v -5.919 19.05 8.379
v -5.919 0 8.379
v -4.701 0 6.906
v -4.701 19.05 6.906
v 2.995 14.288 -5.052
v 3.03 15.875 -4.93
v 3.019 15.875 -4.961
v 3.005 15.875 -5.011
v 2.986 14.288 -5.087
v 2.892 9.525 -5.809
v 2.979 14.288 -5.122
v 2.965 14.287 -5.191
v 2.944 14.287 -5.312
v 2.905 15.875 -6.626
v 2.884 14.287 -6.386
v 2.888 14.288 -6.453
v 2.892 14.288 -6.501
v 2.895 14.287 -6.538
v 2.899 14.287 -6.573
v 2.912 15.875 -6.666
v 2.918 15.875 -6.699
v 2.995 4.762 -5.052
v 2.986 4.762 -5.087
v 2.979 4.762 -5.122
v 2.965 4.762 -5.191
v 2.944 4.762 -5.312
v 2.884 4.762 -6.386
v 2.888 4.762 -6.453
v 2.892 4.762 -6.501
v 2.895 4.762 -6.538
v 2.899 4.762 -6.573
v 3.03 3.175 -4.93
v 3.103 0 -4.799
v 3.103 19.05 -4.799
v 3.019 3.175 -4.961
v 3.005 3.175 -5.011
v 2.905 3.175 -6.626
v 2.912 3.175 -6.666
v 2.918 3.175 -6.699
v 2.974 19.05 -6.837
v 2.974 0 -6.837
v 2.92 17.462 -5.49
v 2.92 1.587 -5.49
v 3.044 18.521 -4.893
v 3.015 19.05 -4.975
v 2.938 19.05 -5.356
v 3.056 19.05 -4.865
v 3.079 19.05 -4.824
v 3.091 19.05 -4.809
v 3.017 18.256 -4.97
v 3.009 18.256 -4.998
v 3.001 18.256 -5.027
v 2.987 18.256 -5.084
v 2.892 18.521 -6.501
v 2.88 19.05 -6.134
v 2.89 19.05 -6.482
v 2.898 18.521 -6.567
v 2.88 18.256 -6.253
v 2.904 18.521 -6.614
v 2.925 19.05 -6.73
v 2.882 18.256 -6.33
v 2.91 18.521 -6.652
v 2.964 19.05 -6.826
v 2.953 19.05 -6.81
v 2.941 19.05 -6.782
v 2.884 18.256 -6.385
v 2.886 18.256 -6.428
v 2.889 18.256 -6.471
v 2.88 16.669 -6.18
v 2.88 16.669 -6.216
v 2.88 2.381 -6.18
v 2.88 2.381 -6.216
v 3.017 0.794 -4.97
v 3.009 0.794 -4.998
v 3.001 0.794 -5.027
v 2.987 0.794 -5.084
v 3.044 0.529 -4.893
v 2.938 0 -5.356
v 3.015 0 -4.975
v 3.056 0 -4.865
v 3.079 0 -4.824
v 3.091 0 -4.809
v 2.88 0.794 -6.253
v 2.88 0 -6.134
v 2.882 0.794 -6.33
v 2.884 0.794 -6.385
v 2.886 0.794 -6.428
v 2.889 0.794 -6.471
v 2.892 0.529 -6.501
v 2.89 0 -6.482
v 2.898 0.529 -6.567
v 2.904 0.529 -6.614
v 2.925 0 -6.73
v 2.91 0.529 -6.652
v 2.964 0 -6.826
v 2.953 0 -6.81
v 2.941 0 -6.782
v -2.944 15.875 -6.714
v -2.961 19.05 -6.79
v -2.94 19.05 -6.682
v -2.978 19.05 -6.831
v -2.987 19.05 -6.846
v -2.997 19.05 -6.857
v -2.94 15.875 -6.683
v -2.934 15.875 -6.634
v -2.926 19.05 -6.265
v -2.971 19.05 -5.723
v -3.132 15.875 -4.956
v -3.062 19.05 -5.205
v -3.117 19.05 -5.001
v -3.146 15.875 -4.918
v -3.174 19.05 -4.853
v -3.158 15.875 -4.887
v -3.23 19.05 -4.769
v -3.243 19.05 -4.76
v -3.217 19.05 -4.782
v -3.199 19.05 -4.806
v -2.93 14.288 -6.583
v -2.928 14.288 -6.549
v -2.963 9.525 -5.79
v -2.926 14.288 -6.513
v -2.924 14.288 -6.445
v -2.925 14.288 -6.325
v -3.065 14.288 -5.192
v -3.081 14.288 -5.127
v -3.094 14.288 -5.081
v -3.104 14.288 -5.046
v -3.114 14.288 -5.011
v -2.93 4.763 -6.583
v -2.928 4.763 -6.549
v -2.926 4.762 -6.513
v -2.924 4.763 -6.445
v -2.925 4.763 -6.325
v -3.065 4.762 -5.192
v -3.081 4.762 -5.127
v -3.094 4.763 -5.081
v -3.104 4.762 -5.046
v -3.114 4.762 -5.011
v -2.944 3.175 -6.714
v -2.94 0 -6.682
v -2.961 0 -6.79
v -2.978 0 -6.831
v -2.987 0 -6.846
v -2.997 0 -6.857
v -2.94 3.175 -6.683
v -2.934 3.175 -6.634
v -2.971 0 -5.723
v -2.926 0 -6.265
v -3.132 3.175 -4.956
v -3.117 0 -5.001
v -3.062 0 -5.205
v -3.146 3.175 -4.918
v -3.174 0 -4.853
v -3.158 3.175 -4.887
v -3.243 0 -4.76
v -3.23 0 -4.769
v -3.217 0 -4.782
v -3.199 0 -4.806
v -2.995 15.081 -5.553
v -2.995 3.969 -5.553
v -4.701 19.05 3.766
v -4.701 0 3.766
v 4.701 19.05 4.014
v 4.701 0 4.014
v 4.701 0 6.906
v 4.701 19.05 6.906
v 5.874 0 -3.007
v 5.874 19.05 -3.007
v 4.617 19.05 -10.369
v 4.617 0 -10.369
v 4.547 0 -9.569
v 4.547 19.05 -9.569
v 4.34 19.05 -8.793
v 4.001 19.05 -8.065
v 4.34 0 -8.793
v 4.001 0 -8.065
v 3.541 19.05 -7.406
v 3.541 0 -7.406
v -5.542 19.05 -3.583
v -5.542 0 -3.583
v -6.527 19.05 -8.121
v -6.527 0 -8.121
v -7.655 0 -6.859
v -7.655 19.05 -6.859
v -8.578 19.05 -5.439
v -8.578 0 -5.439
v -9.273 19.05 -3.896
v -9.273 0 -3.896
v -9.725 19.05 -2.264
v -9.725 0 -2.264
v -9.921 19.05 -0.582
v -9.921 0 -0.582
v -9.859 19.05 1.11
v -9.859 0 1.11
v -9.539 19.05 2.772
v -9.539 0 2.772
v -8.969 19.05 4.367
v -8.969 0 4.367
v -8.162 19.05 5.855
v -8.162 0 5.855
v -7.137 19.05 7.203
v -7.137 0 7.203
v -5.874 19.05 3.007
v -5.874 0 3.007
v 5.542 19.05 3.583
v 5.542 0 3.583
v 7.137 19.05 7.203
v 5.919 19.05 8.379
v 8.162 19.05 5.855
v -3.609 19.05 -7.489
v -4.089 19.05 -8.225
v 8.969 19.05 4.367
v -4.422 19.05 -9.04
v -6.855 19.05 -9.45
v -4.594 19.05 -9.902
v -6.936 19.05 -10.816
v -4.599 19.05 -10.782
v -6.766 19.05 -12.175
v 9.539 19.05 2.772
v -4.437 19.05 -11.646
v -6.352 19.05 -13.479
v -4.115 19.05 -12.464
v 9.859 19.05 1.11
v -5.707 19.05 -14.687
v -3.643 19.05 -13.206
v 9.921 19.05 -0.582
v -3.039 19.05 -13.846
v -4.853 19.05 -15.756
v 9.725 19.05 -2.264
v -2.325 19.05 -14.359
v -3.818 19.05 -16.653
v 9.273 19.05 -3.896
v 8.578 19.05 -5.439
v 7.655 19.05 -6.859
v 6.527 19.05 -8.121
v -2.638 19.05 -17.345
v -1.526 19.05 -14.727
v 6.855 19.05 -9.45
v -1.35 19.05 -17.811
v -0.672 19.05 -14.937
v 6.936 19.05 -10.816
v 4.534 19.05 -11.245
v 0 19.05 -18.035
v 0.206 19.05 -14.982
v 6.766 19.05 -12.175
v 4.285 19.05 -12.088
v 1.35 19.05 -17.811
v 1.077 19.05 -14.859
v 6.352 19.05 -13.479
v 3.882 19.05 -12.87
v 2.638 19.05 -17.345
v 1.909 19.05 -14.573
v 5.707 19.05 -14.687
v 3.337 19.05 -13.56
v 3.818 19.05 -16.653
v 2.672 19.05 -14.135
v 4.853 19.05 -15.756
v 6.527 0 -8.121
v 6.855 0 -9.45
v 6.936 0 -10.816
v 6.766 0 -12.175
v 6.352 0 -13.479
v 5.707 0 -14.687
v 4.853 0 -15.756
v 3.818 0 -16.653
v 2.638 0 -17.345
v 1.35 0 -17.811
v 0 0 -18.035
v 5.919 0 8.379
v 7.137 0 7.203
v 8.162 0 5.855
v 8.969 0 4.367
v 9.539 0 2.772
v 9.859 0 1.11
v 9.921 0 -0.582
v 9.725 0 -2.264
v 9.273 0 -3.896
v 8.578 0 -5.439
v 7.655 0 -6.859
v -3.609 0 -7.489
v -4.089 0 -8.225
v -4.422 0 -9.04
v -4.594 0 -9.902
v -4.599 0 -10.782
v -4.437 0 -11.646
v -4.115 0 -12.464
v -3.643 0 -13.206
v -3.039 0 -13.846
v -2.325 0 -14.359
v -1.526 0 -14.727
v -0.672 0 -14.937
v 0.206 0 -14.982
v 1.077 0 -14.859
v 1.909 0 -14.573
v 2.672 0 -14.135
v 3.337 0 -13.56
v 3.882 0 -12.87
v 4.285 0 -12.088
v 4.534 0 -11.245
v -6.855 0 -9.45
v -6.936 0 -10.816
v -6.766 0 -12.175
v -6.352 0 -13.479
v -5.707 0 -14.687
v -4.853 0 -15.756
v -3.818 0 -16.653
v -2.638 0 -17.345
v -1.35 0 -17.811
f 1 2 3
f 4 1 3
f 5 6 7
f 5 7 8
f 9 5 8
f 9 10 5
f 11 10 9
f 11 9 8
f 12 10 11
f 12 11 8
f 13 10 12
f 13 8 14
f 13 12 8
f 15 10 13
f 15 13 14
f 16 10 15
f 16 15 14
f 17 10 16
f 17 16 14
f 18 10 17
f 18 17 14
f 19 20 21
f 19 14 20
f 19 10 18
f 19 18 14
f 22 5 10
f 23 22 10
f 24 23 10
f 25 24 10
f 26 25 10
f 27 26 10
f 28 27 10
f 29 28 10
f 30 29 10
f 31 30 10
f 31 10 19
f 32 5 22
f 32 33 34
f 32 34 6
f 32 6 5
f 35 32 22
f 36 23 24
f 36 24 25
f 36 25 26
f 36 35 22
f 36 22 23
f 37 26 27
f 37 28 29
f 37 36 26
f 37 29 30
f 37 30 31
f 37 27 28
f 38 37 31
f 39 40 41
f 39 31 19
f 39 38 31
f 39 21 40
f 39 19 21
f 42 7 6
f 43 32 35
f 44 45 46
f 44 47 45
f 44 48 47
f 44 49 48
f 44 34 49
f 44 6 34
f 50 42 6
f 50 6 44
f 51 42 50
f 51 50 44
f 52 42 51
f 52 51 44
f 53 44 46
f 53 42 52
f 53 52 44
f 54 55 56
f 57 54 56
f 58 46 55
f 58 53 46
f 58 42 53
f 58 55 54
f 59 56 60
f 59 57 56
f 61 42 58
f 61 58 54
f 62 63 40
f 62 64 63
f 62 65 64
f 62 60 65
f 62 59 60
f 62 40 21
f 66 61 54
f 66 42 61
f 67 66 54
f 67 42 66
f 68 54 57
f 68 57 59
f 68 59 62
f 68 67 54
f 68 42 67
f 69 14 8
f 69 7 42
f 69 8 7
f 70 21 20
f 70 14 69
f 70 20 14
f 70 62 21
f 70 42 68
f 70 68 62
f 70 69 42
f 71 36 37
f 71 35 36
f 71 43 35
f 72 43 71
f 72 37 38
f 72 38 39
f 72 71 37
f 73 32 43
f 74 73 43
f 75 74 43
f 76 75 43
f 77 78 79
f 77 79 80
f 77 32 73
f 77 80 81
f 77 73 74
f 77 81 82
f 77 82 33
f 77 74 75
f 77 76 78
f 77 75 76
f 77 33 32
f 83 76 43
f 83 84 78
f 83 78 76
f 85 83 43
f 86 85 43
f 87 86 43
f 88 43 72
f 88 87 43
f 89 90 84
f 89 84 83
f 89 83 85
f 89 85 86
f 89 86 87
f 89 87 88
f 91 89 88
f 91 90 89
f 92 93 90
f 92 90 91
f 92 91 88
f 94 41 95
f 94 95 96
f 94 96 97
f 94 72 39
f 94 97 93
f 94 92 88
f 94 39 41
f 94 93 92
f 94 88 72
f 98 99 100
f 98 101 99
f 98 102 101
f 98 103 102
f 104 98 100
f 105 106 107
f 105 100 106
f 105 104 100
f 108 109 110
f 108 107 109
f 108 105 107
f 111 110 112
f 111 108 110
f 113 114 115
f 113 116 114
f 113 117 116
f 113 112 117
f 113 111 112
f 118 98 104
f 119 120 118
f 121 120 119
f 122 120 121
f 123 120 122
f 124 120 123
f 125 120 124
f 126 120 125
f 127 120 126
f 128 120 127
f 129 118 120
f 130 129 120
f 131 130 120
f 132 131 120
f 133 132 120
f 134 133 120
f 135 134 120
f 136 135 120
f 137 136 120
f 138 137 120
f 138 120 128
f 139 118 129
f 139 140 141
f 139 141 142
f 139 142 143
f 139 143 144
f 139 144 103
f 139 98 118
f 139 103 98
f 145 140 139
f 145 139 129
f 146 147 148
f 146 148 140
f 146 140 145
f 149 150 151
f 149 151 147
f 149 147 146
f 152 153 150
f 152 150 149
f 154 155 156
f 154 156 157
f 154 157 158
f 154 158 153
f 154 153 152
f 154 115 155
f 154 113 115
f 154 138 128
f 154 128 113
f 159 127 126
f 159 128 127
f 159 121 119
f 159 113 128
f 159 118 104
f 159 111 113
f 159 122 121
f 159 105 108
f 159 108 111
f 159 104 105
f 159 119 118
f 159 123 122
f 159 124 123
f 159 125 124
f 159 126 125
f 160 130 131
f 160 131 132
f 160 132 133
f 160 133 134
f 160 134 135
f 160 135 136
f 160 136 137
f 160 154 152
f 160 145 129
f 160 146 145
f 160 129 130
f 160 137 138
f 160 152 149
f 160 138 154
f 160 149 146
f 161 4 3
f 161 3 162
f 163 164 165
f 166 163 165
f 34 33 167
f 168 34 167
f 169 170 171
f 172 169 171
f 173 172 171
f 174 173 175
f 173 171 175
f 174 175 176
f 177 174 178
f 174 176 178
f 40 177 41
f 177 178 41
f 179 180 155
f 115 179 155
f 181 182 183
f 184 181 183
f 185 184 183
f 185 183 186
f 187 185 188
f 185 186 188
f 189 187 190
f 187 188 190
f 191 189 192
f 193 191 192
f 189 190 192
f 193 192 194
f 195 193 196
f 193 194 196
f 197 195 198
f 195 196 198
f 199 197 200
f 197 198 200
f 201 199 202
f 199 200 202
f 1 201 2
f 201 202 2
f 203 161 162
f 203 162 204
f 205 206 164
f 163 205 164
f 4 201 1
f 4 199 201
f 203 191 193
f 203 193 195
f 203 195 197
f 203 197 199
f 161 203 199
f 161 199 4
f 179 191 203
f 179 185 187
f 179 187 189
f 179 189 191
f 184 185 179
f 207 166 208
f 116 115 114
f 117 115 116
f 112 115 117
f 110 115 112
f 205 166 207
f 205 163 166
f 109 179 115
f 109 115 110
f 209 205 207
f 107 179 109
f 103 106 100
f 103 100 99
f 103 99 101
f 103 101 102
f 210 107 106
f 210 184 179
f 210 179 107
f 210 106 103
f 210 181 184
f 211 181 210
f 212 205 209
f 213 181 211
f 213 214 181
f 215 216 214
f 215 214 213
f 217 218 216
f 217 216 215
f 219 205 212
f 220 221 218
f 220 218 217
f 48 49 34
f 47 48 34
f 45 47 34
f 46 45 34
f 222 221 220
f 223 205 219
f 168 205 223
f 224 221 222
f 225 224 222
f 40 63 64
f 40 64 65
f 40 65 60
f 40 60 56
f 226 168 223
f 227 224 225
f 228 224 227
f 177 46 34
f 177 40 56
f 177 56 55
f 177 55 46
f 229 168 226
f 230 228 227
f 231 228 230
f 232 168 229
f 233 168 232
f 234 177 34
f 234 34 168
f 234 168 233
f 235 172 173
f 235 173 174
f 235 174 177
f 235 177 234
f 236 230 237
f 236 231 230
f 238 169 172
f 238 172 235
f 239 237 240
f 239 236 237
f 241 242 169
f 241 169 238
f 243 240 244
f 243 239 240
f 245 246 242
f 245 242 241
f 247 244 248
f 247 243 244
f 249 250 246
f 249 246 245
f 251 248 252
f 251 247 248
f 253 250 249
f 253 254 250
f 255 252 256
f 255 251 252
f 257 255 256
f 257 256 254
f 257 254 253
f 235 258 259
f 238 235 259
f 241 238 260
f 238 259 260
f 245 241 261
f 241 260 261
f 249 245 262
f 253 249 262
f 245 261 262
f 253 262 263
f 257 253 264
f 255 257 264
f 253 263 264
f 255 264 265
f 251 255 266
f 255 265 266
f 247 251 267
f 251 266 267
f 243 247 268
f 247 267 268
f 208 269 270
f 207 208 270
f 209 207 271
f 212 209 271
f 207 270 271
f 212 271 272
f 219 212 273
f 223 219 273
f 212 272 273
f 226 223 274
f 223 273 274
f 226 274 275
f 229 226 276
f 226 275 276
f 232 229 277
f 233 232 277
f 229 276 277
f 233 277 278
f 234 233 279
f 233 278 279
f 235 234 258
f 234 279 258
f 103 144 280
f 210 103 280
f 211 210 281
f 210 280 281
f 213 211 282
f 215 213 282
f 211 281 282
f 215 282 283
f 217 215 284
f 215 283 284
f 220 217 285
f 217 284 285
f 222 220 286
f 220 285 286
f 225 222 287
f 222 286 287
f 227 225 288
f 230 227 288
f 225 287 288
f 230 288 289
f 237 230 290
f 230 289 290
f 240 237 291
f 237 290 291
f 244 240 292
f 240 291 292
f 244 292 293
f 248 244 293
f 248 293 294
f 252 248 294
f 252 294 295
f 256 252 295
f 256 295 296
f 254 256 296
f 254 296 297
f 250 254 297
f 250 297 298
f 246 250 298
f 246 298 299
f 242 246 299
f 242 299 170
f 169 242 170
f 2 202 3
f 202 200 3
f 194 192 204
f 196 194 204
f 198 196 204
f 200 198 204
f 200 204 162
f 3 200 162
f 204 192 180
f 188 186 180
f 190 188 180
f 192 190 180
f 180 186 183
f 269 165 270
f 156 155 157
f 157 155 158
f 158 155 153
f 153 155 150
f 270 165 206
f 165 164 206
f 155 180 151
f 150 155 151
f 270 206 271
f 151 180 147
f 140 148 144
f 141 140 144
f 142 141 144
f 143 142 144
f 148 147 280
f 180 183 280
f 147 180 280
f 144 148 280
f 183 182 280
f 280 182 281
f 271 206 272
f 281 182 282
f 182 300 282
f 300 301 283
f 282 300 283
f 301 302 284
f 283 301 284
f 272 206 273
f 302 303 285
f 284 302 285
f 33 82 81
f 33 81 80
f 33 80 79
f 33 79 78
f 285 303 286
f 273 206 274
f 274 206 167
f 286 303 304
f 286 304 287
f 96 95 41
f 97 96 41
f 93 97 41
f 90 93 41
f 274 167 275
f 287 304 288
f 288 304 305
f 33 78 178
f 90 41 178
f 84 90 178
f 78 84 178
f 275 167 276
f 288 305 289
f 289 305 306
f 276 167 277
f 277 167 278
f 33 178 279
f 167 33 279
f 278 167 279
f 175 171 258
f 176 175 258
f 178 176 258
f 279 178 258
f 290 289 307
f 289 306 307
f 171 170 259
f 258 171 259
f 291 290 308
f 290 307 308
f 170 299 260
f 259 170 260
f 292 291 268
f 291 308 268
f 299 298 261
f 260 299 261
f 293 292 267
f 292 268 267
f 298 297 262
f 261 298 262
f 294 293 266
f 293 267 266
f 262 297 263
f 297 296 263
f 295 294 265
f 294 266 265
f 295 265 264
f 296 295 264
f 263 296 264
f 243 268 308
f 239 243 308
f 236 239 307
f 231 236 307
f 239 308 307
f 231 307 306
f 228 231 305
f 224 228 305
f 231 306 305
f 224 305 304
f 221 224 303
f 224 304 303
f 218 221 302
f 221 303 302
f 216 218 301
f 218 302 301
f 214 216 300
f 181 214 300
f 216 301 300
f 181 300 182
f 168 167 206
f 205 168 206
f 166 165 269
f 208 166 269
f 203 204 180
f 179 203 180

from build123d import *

# Parameters (mm, degrees)
BOSS_EXTRUDE1_DEPTH = 19.05


with BuildPart() as part:
    # Sketch3 → Boss-Extrude1 (new body)
    with BuildSketch(Plane(origin=(0, 0, 0), x_dir=(1, 0, 0), z_dir=(0, 1, 0))):
        with BuildLine():
            Line((-5.541525375, 3.58326618), (-2.47962532, 5.150959008))
            Line((-2.47962532, 5.150959008), (-2.47962532, 6.474170352))
            ThreePointArc((-2.47962532, 6.474170352), (-2.221563685, 14.417025562), (4.617359972, 10.369227654))
            ThreePointArc((4.617359972, 10.369227654), (4.047797908, 8.147663968), (2.47962532, 6.474170352))
            Line((2.47962532, 6.474170352), (2.47962532, 5.20231788))
            Line((2.47962532, 5.20231788), (5.873962228, 3.007468661))
            Line((5.873962228, 3.007468661), (5.541525375, -3.58326618))
            Line((5.541525375, -3.58326618), (4.701204968, -4.013510228))
            Line((4.701204968, -4.013510228), (4.701204968, -6.905610932))
            Line((4.701204968, -6.905610932), (5.918780254, -8.378526195))
            ThreePointArc((5.918780254, -8.378526195), (9.922634137, -0.265088751), (6.526624698, 8.120961152))
            ThreePointArc((6.526624698, 8.120961152), (5.706991897, 14.686716316), (0, 18.035026682))
            ThreePointArc((0, 18.035026682), (-5.706991897, 14.686716316), (-6.526624698, 8.120961152))
            ThreePointArc((-6.526624698, 8.120961152), (-9.922634137, -0.265088751), (-5.918780254, -8.378526195))
            Line((-5.918780254, -8.378526195), (-4.701204968, -6.905610932))
            Line((-4.701204968, -6.905610932), (-4.701204968, -3.765798027))
            Line((-4.701204968, -3.765798027), (-5.873962228, -3.007468661))
            Line((-5.873962228, -3.007468661), (-5.541525375, 3.58326618))
        make_face()
        with BuildLine():
            Line((-2.47962532, 6.474170352), (-2.47962532, 5.150959008))
            Line((-2.47962532, 5.150959008), (-1.063503338, 5.876013463))
            ThreePointArc((-1.063503338, 5.876013463), (-1.79663243, 6.115743784), (-2.47962532, 6.474170352))
        make_face()
        with BuildLine():
            ThreePointArc((2.47962532, 6.474170352), (1.921985685, 6.17089654), (1.328021538, 5.946968965))
            Line((1.328021538, 5.946968965), (2.47962532, 5.20231788))
            Line((2.47962532, 5.20231788), (2.47962532, 6.474170352))
        make_face()
    extrude(amount=BOSS_EXTRUDE1_DEPTH)

    # Fillet6
    # a fillet whose section is not a circle: 1.27 mm, written as the material it takes off along each edge
    with BuildSketch(Plane(origin=(1.328021538, -5.283304691, -5.946968965), x_dir=(0.8397378391322112, 0, 0.5429920455490709), z_dir=(0, 1, 0))) as fillet6_piece_1:
        with BuildLine():
            Bezier((2.113321876, 0), (0.3966534, 0), (0.898889741, 1.641556979), weights=[1, 0.118948346, 1])
            ThreePointArc((0.898889741, 1.641556979), (0.533488386, 0.774757636), (0, 0))
            Line((0, 0), (2.113321876, 0))
        make_face()
    extrude(amount=29.616609382, mode=Mode.SUBTRACT)
    with BuildSketch(Plane(origin=(-1.063503338, -6.120582224, -5.876013463), x_dir=(-0.891835980226881, 0, -0.4523589110128793), z_dir=(0, 1, 0))) as fillet6_piece_2:
        with BuildLine():
            Bezier((2.168149873, 0), (0.323600022, 0.445521101), (1.438773255, 1.980852292), weights=[1, 0.11123936, 1])
            Line((1.438773255, 1.980852292), (0, 0))
            ThreePointArc((0, 0), (1.084074937, 0.129064678), (2.168149873, 0))
        make_face()
    extrude(amount=31.291164449, mode=Mode.SUBTRACT)


solid = part.part
